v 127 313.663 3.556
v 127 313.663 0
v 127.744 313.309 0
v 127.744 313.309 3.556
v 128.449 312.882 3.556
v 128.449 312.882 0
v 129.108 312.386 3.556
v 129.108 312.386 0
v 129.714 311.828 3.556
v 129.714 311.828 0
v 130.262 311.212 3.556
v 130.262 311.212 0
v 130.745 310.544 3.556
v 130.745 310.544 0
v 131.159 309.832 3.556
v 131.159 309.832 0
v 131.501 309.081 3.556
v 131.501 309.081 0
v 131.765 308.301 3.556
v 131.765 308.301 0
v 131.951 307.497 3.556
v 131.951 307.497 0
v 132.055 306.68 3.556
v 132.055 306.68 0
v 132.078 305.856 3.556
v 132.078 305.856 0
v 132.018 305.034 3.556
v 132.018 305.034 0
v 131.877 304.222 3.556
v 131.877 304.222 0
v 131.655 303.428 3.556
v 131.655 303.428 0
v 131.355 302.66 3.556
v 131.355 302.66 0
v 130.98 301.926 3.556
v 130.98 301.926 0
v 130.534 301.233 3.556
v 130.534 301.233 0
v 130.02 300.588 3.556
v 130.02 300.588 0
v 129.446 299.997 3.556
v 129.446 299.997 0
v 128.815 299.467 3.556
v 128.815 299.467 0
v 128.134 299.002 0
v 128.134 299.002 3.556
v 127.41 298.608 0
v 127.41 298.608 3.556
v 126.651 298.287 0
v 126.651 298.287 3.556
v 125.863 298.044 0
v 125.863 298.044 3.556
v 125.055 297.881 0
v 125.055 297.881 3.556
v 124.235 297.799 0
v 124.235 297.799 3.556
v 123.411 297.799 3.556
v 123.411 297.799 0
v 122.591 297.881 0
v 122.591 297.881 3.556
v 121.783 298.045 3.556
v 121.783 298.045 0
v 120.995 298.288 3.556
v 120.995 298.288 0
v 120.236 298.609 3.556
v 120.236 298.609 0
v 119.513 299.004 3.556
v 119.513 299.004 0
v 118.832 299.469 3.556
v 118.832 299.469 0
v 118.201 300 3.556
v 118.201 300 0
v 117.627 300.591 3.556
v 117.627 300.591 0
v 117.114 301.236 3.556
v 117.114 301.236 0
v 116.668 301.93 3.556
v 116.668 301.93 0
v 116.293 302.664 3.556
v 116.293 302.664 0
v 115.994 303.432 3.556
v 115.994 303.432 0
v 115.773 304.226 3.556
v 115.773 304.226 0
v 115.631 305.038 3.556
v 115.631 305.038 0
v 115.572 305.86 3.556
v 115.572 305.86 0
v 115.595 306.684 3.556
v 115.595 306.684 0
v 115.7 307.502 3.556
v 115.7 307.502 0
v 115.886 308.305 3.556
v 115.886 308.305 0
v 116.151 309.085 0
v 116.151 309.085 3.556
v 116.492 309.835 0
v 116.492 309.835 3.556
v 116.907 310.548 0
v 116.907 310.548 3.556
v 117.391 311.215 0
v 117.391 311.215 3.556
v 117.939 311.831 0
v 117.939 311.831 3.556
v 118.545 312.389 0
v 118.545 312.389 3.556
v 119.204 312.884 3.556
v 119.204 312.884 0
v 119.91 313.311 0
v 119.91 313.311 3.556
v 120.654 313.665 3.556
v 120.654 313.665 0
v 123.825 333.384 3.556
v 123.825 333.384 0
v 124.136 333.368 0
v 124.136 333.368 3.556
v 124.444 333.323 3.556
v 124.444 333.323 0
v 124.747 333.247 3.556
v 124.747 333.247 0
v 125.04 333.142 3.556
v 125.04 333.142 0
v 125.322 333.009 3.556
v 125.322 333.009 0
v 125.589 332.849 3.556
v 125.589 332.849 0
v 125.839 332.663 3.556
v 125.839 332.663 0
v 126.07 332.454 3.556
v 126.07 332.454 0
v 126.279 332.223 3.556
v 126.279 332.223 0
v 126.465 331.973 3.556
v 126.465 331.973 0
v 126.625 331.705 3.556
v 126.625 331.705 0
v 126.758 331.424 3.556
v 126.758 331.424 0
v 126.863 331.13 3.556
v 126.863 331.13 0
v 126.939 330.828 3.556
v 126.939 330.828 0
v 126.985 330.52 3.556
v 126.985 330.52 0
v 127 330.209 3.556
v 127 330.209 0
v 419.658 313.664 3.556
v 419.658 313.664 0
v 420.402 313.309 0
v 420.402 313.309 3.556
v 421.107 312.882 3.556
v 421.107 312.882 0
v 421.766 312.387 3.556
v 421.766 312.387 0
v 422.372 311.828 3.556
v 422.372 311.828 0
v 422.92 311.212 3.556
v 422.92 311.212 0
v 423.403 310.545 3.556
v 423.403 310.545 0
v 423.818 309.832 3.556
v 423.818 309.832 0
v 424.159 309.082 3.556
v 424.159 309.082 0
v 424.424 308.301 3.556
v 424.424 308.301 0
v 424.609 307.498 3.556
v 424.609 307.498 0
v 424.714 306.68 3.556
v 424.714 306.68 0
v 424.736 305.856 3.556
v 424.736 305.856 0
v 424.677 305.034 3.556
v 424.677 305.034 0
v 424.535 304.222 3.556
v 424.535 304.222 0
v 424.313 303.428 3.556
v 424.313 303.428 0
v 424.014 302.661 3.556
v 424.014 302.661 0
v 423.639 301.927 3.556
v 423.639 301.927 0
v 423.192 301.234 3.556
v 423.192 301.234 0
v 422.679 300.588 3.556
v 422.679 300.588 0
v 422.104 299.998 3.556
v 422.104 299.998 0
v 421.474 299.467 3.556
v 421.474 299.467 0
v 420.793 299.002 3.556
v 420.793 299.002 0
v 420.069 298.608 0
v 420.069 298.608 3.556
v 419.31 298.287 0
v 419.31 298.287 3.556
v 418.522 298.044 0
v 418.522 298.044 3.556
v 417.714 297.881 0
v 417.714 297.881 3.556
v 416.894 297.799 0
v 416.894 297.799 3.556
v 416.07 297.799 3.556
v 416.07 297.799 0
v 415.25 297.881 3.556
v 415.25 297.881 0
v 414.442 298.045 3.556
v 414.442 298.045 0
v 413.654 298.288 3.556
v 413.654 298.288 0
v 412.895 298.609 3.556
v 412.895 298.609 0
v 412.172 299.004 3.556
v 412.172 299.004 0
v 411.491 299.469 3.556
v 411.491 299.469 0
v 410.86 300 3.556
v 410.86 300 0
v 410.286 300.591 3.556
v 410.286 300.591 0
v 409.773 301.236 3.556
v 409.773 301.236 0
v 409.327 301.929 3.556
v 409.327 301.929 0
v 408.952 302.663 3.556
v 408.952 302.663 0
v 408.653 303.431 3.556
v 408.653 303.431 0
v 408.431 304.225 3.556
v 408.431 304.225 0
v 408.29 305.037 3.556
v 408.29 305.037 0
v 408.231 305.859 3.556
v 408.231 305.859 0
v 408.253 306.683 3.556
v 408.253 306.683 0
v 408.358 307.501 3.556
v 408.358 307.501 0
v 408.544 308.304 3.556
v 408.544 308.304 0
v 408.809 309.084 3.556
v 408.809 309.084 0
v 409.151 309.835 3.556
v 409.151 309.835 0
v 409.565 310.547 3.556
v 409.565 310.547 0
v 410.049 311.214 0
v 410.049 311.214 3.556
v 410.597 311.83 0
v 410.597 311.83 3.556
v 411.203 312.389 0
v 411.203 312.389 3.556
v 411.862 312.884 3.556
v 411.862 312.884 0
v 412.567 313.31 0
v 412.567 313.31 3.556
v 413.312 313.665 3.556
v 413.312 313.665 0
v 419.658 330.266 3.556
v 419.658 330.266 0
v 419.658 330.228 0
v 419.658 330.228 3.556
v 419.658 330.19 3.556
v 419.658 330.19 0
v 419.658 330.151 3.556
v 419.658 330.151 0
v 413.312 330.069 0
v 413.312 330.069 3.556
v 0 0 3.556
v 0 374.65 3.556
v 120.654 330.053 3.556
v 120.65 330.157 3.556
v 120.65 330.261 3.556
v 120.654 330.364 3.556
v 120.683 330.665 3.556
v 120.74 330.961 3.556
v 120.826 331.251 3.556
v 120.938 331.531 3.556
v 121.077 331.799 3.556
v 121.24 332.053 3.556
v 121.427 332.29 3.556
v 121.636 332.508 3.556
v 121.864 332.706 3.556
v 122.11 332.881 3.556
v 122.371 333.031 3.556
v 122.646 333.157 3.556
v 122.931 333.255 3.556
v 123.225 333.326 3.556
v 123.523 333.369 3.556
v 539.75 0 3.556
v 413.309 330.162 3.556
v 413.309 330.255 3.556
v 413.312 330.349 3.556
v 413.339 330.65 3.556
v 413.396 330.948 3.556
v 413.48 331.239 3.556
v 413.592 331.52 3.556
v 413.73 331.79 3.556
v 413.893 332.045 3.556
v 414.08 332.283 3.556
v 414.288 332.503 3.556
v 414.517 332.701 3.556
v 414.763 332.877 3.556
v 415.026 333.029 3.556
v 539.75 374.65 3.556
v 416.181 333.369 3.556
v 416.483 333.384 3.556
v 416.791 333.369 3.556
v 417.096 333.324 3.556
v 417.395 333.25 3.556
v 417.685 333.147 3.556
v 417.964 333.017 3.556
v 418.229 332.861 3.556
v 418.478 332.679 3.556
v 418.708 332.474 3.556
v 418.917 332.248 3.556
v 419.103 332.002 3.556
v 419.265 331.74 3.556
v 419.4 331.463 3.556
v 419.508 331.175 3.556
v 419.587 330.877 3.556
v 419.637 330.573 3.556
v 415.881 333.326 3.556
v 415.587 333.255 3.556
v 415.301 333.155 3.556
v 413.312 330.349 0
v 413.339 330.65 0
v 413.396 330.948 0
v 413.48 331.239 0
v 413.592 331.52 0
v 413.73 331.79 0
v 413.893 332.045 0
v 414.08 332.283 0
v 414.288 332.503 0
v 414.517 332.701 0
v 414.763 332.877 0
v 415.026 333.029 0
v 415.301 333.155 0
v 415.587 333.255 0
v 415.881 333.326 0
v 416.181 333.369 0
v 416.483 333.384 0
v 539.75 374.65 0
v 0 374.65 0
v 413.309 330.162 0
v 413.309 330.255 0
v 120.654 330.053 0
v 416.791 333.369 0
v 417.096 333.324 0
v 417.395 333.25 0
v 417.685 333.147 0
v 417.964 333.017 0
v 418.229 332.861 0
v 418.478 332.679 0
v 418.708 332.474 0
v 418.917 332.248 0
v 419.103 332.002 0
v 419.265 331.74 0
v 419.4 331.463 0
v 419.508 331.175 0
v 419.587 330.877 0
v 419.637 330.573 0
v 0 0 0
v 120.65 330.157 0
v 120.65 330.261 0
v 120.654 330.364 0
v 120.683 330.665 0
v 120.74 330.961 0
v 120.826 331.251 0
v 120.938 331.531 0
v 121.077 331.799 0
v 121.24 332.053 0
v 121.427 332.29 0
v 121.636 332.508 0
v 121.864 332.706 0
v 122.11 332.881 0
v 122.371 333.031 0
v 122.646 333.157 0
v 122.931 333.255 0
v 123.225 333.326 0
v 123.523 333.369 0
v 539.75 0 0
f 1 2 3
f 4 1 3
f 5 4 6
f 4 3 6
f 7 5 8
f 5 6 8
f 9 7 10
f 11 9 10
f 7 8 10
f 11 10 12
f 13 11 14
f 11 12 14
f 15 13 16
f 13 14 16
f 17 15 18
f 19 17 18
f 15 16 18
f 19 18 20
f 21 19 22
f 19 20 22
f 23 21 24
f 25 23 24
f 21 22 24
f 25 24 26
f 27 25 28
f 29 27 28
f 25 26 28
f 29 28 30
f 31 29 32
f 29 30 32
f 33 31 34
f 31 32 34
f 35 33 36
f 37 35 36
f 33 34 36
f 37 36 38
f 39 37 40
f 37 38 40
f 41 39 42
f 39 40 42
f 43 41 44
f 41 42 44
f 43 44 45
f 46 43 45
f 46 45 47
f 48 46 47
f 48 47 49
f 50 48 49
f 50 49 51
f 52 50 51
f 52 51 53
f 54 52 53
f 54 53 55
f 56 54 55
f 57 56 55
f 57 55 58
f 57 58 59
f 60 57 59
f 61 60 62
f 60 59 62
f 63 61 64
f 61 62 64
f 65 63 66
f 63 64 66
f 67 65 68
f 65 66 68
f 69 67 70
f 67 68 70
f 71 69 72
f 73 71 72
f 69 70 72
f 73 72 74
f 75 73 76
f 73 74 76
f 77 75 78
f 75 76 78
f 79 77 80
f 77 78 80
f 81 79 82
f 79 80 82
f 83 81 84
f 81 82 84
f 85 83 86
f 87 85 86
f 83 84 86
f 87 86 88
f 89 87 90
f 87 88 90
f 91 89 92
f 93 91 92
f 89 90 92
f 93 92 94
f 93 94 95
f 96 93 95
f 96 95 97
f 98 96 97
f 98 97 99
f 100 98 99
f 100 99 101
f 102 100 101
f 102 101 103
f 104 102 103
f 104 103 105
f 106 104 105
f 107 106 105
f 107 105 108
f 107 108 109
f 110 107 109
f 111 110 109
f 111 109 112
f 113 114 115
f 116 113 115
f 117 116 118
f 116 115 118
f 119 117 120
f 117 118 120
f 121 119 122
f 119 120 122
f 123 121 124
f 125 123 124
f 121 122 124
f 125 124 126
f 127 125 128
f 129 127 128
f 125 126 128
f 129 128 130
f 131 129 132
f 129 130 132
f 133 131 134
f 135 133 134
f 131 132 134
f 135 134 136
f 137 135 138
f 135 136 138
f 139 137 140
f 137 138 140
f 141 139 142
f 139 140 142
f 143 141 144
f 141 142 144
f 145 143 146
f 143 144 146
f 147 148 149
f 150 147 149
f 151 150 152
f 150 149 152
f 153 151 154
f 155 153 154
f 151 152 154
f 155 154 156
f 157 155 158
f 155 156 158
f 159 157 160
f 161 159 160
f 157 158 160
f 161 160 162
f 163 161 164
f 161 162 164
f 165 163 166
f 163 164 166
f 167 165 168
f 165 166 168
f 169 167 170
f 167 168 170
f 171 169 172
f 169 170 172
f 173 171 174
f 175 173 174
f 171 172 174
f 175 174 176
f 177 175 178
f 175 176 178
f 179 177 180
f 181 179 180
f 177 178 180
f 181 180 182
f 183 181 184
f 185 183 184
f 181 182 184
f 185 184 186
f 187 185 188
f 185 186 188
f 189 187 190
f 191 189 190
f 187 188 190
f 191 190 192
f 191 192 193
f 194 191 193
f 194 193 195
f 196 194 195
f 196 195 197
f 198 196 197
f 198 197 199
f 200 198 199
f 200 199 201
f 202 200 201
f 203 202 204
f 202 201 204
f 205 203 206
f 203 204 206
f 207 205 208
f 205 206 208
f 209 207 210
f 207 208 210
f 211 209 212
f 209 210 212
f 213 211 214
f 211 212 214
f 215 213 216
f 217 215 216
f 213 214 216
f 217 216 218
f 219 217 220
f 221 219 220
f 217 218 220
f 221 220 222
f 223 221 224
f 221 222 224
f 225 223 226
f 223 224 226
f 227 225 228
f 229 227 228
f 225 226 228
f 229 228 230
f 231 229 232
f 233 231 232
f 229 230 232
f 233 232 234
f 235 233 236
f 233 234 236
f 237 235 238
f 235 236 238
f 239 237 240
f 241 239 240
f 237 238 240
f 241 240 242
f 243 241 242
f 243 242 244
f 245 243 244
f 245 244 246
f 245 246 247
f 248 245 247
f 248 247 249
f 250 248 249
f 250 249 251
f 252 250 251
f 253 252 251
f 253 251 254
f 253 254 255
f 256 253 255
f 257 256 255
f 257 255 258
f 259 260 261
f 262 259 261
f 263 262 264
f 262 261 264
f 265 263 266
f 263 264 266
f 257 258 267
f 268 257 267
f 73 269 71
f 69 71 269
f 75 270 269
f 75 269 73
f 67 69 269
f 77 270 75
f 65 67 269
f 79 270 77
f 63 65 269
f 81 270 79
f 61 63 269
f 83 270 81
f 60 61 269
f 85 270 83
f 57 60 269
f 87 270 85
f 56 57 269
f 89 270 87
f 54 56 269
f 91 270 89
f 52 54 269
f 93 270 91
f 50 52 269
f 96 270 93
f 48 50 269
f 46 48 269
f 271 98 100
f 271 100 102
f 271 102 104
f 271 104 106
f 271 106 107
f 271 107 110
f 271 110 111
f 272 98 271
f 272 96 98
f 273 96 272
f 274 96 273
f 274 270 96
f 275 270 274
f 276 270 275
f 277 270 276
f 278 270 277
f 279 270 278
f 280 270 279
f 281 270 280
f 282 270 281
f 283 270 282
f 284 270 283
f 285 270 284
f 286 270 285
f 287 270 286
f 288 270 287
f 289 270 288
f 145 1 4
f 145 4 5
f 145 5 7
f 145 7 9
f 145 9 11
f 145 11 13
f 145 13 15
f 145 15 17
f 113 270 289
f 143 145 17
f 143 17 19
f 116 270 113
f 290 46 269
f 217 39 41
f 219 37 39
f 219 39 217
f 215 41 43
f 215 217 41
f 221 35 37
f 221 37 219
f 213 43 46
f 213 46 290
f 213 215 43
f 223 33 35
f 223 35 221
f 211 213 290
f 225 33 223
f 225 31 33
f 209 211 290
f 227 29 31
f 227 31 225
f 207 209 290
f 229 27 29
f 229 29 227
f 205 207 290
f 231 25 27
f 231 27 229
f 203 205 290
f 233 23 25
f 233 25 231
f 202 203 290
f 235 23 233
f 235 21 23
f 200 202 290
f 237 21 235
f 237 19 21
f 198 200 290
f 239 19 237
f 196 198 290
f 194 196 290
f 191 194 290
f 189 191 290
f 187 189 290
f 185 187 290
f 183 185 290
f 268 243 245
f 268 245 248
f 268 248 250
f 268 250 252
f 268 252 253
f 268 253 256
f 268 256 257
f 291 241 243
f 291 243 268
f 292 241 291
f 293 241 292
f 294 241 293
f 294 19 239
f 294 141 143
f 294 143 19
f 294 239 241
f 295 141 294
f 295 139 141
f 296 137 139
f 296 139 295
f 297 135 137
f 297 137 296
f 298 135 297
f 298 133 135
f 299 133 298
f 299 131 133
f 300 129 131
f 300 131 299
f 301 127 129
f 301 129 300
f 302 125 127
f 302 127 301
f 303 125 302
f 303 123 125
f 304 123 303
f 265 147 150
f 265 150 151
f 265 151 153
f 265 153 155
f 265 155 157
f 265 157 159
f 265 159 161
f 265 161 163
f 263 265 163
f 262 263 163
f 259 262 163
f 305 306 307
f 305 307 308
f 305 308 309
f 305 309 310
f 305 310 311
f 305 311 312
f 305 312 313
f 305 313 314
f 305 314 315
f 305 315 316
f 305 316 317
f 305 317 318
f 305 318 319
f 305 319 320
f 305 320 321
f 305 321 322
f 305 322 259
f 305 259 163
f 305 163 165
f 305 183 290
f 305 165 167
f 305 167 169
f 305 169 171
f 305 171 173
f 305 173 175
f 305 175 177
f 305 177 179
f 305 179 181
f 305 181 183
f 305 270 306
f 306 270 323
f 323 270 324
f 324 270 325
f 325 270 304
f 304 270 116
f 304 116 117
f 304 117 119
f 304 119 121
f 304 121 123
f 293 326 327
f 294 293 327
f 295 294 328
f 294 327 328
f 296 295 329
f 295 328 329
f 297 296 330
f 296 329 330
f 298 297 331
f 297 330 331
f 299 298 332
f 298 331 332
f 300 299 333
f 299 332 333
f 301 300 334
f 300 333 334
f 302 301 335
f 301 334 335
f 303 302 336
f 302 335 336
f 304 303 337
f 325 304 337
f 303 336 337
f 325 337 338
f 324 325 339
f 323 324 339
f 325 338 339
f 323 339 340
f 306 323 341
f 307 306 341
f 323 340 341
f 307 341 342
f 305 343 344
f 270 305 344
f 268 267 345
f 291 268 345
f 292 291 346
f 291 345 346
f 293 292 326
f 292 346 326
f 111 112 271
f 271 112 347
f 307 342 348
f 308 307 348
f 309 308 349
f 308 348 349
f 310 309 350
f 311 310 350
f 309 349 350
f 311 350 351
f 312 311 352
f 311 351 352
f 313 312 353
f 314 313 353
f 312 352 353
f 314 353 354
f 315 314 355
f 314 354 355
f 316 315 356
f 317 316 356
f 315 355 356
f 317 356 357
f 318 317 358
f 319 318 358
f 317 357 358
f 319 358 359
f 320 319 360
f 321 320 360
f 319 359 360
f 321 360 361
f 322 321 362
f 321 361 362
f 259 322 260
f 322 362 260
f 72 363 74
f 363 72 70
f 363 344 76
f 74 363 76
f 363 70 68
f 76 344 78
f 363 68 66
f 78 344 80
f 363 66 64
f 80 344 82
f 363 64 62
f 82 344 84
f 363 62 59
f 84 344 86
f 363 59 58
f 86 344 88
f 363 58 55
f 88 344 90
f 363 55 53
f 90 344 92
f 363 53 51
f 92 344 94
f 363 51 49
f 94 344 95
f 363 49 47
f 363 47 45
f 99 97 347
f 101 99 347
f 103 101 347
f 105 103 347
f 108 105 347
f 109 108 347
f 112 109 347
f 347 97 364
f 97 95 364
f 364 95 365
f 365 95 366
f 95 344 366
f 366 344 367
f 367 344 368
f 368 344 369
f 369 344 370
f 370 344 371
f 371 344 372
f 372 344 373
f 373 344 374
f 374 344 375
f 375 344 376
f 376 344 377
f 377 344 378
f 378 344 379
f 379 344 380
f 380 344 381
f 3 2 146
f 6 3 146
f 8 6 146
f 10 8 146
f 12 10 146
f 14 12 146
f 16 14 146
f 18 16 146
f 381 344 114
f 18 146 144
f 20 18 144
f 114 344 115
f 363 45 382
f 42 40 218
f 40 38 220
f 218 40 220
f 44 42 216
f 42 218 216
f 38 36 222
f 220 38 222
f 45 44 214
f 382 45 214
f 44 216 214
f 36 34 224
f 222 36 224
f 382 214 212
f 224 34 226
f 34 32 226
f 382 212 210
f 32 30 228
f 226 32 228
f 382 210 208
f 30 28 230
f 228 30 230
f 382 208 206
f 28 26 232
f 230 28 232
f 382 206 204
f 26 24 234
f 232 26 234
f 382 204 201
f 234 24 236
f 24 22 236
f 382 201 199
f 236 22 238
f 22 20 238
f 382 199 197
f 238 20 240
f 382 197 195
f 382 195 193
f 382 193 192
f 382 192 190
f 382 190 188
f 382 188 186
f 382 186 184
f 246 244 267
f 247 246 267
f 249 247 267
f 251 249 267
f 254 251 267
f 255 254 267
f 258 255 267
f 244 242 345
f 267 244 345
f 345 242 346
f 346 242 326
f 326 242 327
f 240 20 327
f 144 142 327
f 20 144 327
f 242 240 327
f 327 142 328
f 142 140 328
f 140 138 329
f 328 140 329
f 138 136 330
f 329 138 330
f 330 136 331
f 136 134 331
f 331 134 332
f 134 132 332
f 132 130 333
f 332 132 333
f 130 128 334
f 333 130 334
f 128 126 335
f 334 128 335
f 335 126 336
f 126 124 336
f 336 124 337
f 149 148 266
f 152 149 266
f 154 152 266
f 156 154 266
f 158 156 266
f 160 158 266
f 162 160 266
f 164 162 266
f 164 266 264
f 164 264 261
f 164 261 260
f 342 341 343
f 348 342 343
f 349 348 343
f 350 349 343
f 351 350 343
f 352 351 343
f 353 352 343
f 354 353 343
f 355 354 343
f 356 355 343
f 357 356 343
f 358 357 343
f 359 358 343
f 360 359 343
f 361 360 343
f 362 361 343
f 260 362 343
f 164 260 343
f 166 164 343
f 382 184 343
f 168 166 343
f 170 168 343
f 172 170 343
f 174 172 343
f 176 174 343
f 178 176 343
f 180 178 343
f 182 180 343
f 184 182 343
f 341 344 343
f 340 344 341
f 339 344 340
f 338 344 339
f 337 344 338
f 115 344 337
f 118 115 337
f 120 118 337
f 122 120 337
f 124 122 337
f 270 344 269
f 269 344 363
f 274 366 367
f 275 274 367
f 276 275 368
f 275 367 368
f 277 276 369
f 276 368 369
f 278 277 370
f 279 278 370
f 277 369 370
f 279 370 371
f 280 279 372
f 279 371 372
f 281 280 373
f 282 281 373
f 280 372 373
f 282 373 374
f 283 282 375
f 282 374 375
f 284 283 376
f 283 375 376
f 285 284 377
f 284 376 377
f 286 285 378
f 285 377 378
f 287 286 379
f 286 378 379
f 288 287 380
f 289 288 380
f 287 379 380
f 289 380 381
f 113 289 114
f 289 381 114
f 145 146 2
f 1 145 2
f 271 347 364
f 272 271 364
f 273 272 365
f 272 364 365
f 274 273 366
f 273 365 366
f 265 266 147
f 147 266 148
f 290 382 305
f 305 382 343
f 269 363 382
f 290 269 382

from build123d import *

# Parameters (mm, degrees)
F1_DEPTH = 3.556


with BuildPart() as f1:
    # F0 (on Top) → F1 (new body)
    with BuildSketch(Plane.XY):
        Polygon((0, 374.65), (0, 0), (539.75, 0), (539.75, 374.65), (416.483468, 374.65), (123.825, 374.65), align=None)
        with BuildLine():
            ThreePointArc((120.653815, 330.36432), (121.635642, 332.508135), (123.825, 333.383715))
            ThreePointArc((123.825, 333.383715), (126.070064, 332.453779), (127, 330.208715))
            Line((127, 330.208715), (127, 313.663327))
            ThreePointArc((127, 313.663327), (123.822934, 297.788327), (120.653815, 313.664915))
            Line((120.653815, 313.664915), (120.653815, 330.05311))
            ThreePointArc((120.653815, 330.05311), (120.65, 330.208715), (120.653815, 330.36432))
        make_face(mode=Mode.SUBTRACT)
        with BuildLine():
            ThreePointArc((413.311554, 330.348675), (414.288445, 332.502729), (416.483468, 333.383715))
            ThreePointArc((416.483468, 333.383715), (418.708128, 332.473999), (419.657948, 330.266165))
            ThreePointArc((419.657948, 330.266165), (419.658468, 330.208715), (419.657948, 330.151265))
            Line((419.657948, 330.151265), (419.657948, 313.663543))
            ThreePointArc((419.657948, 313.663543), (416.482078, 297.788327), (413.311554, 313.664612))
            Line((413.311554, 313.664612), (413.311554, 330.068754))
            ThreePointArc((413.311554, 330.068754), (413.308468, 330.208715), (413.311554, 330.348675))
        make_face(mode=Mode.SUBTRACT)
    extrude(amount=F1_DEPTH)


solid = f1.part
